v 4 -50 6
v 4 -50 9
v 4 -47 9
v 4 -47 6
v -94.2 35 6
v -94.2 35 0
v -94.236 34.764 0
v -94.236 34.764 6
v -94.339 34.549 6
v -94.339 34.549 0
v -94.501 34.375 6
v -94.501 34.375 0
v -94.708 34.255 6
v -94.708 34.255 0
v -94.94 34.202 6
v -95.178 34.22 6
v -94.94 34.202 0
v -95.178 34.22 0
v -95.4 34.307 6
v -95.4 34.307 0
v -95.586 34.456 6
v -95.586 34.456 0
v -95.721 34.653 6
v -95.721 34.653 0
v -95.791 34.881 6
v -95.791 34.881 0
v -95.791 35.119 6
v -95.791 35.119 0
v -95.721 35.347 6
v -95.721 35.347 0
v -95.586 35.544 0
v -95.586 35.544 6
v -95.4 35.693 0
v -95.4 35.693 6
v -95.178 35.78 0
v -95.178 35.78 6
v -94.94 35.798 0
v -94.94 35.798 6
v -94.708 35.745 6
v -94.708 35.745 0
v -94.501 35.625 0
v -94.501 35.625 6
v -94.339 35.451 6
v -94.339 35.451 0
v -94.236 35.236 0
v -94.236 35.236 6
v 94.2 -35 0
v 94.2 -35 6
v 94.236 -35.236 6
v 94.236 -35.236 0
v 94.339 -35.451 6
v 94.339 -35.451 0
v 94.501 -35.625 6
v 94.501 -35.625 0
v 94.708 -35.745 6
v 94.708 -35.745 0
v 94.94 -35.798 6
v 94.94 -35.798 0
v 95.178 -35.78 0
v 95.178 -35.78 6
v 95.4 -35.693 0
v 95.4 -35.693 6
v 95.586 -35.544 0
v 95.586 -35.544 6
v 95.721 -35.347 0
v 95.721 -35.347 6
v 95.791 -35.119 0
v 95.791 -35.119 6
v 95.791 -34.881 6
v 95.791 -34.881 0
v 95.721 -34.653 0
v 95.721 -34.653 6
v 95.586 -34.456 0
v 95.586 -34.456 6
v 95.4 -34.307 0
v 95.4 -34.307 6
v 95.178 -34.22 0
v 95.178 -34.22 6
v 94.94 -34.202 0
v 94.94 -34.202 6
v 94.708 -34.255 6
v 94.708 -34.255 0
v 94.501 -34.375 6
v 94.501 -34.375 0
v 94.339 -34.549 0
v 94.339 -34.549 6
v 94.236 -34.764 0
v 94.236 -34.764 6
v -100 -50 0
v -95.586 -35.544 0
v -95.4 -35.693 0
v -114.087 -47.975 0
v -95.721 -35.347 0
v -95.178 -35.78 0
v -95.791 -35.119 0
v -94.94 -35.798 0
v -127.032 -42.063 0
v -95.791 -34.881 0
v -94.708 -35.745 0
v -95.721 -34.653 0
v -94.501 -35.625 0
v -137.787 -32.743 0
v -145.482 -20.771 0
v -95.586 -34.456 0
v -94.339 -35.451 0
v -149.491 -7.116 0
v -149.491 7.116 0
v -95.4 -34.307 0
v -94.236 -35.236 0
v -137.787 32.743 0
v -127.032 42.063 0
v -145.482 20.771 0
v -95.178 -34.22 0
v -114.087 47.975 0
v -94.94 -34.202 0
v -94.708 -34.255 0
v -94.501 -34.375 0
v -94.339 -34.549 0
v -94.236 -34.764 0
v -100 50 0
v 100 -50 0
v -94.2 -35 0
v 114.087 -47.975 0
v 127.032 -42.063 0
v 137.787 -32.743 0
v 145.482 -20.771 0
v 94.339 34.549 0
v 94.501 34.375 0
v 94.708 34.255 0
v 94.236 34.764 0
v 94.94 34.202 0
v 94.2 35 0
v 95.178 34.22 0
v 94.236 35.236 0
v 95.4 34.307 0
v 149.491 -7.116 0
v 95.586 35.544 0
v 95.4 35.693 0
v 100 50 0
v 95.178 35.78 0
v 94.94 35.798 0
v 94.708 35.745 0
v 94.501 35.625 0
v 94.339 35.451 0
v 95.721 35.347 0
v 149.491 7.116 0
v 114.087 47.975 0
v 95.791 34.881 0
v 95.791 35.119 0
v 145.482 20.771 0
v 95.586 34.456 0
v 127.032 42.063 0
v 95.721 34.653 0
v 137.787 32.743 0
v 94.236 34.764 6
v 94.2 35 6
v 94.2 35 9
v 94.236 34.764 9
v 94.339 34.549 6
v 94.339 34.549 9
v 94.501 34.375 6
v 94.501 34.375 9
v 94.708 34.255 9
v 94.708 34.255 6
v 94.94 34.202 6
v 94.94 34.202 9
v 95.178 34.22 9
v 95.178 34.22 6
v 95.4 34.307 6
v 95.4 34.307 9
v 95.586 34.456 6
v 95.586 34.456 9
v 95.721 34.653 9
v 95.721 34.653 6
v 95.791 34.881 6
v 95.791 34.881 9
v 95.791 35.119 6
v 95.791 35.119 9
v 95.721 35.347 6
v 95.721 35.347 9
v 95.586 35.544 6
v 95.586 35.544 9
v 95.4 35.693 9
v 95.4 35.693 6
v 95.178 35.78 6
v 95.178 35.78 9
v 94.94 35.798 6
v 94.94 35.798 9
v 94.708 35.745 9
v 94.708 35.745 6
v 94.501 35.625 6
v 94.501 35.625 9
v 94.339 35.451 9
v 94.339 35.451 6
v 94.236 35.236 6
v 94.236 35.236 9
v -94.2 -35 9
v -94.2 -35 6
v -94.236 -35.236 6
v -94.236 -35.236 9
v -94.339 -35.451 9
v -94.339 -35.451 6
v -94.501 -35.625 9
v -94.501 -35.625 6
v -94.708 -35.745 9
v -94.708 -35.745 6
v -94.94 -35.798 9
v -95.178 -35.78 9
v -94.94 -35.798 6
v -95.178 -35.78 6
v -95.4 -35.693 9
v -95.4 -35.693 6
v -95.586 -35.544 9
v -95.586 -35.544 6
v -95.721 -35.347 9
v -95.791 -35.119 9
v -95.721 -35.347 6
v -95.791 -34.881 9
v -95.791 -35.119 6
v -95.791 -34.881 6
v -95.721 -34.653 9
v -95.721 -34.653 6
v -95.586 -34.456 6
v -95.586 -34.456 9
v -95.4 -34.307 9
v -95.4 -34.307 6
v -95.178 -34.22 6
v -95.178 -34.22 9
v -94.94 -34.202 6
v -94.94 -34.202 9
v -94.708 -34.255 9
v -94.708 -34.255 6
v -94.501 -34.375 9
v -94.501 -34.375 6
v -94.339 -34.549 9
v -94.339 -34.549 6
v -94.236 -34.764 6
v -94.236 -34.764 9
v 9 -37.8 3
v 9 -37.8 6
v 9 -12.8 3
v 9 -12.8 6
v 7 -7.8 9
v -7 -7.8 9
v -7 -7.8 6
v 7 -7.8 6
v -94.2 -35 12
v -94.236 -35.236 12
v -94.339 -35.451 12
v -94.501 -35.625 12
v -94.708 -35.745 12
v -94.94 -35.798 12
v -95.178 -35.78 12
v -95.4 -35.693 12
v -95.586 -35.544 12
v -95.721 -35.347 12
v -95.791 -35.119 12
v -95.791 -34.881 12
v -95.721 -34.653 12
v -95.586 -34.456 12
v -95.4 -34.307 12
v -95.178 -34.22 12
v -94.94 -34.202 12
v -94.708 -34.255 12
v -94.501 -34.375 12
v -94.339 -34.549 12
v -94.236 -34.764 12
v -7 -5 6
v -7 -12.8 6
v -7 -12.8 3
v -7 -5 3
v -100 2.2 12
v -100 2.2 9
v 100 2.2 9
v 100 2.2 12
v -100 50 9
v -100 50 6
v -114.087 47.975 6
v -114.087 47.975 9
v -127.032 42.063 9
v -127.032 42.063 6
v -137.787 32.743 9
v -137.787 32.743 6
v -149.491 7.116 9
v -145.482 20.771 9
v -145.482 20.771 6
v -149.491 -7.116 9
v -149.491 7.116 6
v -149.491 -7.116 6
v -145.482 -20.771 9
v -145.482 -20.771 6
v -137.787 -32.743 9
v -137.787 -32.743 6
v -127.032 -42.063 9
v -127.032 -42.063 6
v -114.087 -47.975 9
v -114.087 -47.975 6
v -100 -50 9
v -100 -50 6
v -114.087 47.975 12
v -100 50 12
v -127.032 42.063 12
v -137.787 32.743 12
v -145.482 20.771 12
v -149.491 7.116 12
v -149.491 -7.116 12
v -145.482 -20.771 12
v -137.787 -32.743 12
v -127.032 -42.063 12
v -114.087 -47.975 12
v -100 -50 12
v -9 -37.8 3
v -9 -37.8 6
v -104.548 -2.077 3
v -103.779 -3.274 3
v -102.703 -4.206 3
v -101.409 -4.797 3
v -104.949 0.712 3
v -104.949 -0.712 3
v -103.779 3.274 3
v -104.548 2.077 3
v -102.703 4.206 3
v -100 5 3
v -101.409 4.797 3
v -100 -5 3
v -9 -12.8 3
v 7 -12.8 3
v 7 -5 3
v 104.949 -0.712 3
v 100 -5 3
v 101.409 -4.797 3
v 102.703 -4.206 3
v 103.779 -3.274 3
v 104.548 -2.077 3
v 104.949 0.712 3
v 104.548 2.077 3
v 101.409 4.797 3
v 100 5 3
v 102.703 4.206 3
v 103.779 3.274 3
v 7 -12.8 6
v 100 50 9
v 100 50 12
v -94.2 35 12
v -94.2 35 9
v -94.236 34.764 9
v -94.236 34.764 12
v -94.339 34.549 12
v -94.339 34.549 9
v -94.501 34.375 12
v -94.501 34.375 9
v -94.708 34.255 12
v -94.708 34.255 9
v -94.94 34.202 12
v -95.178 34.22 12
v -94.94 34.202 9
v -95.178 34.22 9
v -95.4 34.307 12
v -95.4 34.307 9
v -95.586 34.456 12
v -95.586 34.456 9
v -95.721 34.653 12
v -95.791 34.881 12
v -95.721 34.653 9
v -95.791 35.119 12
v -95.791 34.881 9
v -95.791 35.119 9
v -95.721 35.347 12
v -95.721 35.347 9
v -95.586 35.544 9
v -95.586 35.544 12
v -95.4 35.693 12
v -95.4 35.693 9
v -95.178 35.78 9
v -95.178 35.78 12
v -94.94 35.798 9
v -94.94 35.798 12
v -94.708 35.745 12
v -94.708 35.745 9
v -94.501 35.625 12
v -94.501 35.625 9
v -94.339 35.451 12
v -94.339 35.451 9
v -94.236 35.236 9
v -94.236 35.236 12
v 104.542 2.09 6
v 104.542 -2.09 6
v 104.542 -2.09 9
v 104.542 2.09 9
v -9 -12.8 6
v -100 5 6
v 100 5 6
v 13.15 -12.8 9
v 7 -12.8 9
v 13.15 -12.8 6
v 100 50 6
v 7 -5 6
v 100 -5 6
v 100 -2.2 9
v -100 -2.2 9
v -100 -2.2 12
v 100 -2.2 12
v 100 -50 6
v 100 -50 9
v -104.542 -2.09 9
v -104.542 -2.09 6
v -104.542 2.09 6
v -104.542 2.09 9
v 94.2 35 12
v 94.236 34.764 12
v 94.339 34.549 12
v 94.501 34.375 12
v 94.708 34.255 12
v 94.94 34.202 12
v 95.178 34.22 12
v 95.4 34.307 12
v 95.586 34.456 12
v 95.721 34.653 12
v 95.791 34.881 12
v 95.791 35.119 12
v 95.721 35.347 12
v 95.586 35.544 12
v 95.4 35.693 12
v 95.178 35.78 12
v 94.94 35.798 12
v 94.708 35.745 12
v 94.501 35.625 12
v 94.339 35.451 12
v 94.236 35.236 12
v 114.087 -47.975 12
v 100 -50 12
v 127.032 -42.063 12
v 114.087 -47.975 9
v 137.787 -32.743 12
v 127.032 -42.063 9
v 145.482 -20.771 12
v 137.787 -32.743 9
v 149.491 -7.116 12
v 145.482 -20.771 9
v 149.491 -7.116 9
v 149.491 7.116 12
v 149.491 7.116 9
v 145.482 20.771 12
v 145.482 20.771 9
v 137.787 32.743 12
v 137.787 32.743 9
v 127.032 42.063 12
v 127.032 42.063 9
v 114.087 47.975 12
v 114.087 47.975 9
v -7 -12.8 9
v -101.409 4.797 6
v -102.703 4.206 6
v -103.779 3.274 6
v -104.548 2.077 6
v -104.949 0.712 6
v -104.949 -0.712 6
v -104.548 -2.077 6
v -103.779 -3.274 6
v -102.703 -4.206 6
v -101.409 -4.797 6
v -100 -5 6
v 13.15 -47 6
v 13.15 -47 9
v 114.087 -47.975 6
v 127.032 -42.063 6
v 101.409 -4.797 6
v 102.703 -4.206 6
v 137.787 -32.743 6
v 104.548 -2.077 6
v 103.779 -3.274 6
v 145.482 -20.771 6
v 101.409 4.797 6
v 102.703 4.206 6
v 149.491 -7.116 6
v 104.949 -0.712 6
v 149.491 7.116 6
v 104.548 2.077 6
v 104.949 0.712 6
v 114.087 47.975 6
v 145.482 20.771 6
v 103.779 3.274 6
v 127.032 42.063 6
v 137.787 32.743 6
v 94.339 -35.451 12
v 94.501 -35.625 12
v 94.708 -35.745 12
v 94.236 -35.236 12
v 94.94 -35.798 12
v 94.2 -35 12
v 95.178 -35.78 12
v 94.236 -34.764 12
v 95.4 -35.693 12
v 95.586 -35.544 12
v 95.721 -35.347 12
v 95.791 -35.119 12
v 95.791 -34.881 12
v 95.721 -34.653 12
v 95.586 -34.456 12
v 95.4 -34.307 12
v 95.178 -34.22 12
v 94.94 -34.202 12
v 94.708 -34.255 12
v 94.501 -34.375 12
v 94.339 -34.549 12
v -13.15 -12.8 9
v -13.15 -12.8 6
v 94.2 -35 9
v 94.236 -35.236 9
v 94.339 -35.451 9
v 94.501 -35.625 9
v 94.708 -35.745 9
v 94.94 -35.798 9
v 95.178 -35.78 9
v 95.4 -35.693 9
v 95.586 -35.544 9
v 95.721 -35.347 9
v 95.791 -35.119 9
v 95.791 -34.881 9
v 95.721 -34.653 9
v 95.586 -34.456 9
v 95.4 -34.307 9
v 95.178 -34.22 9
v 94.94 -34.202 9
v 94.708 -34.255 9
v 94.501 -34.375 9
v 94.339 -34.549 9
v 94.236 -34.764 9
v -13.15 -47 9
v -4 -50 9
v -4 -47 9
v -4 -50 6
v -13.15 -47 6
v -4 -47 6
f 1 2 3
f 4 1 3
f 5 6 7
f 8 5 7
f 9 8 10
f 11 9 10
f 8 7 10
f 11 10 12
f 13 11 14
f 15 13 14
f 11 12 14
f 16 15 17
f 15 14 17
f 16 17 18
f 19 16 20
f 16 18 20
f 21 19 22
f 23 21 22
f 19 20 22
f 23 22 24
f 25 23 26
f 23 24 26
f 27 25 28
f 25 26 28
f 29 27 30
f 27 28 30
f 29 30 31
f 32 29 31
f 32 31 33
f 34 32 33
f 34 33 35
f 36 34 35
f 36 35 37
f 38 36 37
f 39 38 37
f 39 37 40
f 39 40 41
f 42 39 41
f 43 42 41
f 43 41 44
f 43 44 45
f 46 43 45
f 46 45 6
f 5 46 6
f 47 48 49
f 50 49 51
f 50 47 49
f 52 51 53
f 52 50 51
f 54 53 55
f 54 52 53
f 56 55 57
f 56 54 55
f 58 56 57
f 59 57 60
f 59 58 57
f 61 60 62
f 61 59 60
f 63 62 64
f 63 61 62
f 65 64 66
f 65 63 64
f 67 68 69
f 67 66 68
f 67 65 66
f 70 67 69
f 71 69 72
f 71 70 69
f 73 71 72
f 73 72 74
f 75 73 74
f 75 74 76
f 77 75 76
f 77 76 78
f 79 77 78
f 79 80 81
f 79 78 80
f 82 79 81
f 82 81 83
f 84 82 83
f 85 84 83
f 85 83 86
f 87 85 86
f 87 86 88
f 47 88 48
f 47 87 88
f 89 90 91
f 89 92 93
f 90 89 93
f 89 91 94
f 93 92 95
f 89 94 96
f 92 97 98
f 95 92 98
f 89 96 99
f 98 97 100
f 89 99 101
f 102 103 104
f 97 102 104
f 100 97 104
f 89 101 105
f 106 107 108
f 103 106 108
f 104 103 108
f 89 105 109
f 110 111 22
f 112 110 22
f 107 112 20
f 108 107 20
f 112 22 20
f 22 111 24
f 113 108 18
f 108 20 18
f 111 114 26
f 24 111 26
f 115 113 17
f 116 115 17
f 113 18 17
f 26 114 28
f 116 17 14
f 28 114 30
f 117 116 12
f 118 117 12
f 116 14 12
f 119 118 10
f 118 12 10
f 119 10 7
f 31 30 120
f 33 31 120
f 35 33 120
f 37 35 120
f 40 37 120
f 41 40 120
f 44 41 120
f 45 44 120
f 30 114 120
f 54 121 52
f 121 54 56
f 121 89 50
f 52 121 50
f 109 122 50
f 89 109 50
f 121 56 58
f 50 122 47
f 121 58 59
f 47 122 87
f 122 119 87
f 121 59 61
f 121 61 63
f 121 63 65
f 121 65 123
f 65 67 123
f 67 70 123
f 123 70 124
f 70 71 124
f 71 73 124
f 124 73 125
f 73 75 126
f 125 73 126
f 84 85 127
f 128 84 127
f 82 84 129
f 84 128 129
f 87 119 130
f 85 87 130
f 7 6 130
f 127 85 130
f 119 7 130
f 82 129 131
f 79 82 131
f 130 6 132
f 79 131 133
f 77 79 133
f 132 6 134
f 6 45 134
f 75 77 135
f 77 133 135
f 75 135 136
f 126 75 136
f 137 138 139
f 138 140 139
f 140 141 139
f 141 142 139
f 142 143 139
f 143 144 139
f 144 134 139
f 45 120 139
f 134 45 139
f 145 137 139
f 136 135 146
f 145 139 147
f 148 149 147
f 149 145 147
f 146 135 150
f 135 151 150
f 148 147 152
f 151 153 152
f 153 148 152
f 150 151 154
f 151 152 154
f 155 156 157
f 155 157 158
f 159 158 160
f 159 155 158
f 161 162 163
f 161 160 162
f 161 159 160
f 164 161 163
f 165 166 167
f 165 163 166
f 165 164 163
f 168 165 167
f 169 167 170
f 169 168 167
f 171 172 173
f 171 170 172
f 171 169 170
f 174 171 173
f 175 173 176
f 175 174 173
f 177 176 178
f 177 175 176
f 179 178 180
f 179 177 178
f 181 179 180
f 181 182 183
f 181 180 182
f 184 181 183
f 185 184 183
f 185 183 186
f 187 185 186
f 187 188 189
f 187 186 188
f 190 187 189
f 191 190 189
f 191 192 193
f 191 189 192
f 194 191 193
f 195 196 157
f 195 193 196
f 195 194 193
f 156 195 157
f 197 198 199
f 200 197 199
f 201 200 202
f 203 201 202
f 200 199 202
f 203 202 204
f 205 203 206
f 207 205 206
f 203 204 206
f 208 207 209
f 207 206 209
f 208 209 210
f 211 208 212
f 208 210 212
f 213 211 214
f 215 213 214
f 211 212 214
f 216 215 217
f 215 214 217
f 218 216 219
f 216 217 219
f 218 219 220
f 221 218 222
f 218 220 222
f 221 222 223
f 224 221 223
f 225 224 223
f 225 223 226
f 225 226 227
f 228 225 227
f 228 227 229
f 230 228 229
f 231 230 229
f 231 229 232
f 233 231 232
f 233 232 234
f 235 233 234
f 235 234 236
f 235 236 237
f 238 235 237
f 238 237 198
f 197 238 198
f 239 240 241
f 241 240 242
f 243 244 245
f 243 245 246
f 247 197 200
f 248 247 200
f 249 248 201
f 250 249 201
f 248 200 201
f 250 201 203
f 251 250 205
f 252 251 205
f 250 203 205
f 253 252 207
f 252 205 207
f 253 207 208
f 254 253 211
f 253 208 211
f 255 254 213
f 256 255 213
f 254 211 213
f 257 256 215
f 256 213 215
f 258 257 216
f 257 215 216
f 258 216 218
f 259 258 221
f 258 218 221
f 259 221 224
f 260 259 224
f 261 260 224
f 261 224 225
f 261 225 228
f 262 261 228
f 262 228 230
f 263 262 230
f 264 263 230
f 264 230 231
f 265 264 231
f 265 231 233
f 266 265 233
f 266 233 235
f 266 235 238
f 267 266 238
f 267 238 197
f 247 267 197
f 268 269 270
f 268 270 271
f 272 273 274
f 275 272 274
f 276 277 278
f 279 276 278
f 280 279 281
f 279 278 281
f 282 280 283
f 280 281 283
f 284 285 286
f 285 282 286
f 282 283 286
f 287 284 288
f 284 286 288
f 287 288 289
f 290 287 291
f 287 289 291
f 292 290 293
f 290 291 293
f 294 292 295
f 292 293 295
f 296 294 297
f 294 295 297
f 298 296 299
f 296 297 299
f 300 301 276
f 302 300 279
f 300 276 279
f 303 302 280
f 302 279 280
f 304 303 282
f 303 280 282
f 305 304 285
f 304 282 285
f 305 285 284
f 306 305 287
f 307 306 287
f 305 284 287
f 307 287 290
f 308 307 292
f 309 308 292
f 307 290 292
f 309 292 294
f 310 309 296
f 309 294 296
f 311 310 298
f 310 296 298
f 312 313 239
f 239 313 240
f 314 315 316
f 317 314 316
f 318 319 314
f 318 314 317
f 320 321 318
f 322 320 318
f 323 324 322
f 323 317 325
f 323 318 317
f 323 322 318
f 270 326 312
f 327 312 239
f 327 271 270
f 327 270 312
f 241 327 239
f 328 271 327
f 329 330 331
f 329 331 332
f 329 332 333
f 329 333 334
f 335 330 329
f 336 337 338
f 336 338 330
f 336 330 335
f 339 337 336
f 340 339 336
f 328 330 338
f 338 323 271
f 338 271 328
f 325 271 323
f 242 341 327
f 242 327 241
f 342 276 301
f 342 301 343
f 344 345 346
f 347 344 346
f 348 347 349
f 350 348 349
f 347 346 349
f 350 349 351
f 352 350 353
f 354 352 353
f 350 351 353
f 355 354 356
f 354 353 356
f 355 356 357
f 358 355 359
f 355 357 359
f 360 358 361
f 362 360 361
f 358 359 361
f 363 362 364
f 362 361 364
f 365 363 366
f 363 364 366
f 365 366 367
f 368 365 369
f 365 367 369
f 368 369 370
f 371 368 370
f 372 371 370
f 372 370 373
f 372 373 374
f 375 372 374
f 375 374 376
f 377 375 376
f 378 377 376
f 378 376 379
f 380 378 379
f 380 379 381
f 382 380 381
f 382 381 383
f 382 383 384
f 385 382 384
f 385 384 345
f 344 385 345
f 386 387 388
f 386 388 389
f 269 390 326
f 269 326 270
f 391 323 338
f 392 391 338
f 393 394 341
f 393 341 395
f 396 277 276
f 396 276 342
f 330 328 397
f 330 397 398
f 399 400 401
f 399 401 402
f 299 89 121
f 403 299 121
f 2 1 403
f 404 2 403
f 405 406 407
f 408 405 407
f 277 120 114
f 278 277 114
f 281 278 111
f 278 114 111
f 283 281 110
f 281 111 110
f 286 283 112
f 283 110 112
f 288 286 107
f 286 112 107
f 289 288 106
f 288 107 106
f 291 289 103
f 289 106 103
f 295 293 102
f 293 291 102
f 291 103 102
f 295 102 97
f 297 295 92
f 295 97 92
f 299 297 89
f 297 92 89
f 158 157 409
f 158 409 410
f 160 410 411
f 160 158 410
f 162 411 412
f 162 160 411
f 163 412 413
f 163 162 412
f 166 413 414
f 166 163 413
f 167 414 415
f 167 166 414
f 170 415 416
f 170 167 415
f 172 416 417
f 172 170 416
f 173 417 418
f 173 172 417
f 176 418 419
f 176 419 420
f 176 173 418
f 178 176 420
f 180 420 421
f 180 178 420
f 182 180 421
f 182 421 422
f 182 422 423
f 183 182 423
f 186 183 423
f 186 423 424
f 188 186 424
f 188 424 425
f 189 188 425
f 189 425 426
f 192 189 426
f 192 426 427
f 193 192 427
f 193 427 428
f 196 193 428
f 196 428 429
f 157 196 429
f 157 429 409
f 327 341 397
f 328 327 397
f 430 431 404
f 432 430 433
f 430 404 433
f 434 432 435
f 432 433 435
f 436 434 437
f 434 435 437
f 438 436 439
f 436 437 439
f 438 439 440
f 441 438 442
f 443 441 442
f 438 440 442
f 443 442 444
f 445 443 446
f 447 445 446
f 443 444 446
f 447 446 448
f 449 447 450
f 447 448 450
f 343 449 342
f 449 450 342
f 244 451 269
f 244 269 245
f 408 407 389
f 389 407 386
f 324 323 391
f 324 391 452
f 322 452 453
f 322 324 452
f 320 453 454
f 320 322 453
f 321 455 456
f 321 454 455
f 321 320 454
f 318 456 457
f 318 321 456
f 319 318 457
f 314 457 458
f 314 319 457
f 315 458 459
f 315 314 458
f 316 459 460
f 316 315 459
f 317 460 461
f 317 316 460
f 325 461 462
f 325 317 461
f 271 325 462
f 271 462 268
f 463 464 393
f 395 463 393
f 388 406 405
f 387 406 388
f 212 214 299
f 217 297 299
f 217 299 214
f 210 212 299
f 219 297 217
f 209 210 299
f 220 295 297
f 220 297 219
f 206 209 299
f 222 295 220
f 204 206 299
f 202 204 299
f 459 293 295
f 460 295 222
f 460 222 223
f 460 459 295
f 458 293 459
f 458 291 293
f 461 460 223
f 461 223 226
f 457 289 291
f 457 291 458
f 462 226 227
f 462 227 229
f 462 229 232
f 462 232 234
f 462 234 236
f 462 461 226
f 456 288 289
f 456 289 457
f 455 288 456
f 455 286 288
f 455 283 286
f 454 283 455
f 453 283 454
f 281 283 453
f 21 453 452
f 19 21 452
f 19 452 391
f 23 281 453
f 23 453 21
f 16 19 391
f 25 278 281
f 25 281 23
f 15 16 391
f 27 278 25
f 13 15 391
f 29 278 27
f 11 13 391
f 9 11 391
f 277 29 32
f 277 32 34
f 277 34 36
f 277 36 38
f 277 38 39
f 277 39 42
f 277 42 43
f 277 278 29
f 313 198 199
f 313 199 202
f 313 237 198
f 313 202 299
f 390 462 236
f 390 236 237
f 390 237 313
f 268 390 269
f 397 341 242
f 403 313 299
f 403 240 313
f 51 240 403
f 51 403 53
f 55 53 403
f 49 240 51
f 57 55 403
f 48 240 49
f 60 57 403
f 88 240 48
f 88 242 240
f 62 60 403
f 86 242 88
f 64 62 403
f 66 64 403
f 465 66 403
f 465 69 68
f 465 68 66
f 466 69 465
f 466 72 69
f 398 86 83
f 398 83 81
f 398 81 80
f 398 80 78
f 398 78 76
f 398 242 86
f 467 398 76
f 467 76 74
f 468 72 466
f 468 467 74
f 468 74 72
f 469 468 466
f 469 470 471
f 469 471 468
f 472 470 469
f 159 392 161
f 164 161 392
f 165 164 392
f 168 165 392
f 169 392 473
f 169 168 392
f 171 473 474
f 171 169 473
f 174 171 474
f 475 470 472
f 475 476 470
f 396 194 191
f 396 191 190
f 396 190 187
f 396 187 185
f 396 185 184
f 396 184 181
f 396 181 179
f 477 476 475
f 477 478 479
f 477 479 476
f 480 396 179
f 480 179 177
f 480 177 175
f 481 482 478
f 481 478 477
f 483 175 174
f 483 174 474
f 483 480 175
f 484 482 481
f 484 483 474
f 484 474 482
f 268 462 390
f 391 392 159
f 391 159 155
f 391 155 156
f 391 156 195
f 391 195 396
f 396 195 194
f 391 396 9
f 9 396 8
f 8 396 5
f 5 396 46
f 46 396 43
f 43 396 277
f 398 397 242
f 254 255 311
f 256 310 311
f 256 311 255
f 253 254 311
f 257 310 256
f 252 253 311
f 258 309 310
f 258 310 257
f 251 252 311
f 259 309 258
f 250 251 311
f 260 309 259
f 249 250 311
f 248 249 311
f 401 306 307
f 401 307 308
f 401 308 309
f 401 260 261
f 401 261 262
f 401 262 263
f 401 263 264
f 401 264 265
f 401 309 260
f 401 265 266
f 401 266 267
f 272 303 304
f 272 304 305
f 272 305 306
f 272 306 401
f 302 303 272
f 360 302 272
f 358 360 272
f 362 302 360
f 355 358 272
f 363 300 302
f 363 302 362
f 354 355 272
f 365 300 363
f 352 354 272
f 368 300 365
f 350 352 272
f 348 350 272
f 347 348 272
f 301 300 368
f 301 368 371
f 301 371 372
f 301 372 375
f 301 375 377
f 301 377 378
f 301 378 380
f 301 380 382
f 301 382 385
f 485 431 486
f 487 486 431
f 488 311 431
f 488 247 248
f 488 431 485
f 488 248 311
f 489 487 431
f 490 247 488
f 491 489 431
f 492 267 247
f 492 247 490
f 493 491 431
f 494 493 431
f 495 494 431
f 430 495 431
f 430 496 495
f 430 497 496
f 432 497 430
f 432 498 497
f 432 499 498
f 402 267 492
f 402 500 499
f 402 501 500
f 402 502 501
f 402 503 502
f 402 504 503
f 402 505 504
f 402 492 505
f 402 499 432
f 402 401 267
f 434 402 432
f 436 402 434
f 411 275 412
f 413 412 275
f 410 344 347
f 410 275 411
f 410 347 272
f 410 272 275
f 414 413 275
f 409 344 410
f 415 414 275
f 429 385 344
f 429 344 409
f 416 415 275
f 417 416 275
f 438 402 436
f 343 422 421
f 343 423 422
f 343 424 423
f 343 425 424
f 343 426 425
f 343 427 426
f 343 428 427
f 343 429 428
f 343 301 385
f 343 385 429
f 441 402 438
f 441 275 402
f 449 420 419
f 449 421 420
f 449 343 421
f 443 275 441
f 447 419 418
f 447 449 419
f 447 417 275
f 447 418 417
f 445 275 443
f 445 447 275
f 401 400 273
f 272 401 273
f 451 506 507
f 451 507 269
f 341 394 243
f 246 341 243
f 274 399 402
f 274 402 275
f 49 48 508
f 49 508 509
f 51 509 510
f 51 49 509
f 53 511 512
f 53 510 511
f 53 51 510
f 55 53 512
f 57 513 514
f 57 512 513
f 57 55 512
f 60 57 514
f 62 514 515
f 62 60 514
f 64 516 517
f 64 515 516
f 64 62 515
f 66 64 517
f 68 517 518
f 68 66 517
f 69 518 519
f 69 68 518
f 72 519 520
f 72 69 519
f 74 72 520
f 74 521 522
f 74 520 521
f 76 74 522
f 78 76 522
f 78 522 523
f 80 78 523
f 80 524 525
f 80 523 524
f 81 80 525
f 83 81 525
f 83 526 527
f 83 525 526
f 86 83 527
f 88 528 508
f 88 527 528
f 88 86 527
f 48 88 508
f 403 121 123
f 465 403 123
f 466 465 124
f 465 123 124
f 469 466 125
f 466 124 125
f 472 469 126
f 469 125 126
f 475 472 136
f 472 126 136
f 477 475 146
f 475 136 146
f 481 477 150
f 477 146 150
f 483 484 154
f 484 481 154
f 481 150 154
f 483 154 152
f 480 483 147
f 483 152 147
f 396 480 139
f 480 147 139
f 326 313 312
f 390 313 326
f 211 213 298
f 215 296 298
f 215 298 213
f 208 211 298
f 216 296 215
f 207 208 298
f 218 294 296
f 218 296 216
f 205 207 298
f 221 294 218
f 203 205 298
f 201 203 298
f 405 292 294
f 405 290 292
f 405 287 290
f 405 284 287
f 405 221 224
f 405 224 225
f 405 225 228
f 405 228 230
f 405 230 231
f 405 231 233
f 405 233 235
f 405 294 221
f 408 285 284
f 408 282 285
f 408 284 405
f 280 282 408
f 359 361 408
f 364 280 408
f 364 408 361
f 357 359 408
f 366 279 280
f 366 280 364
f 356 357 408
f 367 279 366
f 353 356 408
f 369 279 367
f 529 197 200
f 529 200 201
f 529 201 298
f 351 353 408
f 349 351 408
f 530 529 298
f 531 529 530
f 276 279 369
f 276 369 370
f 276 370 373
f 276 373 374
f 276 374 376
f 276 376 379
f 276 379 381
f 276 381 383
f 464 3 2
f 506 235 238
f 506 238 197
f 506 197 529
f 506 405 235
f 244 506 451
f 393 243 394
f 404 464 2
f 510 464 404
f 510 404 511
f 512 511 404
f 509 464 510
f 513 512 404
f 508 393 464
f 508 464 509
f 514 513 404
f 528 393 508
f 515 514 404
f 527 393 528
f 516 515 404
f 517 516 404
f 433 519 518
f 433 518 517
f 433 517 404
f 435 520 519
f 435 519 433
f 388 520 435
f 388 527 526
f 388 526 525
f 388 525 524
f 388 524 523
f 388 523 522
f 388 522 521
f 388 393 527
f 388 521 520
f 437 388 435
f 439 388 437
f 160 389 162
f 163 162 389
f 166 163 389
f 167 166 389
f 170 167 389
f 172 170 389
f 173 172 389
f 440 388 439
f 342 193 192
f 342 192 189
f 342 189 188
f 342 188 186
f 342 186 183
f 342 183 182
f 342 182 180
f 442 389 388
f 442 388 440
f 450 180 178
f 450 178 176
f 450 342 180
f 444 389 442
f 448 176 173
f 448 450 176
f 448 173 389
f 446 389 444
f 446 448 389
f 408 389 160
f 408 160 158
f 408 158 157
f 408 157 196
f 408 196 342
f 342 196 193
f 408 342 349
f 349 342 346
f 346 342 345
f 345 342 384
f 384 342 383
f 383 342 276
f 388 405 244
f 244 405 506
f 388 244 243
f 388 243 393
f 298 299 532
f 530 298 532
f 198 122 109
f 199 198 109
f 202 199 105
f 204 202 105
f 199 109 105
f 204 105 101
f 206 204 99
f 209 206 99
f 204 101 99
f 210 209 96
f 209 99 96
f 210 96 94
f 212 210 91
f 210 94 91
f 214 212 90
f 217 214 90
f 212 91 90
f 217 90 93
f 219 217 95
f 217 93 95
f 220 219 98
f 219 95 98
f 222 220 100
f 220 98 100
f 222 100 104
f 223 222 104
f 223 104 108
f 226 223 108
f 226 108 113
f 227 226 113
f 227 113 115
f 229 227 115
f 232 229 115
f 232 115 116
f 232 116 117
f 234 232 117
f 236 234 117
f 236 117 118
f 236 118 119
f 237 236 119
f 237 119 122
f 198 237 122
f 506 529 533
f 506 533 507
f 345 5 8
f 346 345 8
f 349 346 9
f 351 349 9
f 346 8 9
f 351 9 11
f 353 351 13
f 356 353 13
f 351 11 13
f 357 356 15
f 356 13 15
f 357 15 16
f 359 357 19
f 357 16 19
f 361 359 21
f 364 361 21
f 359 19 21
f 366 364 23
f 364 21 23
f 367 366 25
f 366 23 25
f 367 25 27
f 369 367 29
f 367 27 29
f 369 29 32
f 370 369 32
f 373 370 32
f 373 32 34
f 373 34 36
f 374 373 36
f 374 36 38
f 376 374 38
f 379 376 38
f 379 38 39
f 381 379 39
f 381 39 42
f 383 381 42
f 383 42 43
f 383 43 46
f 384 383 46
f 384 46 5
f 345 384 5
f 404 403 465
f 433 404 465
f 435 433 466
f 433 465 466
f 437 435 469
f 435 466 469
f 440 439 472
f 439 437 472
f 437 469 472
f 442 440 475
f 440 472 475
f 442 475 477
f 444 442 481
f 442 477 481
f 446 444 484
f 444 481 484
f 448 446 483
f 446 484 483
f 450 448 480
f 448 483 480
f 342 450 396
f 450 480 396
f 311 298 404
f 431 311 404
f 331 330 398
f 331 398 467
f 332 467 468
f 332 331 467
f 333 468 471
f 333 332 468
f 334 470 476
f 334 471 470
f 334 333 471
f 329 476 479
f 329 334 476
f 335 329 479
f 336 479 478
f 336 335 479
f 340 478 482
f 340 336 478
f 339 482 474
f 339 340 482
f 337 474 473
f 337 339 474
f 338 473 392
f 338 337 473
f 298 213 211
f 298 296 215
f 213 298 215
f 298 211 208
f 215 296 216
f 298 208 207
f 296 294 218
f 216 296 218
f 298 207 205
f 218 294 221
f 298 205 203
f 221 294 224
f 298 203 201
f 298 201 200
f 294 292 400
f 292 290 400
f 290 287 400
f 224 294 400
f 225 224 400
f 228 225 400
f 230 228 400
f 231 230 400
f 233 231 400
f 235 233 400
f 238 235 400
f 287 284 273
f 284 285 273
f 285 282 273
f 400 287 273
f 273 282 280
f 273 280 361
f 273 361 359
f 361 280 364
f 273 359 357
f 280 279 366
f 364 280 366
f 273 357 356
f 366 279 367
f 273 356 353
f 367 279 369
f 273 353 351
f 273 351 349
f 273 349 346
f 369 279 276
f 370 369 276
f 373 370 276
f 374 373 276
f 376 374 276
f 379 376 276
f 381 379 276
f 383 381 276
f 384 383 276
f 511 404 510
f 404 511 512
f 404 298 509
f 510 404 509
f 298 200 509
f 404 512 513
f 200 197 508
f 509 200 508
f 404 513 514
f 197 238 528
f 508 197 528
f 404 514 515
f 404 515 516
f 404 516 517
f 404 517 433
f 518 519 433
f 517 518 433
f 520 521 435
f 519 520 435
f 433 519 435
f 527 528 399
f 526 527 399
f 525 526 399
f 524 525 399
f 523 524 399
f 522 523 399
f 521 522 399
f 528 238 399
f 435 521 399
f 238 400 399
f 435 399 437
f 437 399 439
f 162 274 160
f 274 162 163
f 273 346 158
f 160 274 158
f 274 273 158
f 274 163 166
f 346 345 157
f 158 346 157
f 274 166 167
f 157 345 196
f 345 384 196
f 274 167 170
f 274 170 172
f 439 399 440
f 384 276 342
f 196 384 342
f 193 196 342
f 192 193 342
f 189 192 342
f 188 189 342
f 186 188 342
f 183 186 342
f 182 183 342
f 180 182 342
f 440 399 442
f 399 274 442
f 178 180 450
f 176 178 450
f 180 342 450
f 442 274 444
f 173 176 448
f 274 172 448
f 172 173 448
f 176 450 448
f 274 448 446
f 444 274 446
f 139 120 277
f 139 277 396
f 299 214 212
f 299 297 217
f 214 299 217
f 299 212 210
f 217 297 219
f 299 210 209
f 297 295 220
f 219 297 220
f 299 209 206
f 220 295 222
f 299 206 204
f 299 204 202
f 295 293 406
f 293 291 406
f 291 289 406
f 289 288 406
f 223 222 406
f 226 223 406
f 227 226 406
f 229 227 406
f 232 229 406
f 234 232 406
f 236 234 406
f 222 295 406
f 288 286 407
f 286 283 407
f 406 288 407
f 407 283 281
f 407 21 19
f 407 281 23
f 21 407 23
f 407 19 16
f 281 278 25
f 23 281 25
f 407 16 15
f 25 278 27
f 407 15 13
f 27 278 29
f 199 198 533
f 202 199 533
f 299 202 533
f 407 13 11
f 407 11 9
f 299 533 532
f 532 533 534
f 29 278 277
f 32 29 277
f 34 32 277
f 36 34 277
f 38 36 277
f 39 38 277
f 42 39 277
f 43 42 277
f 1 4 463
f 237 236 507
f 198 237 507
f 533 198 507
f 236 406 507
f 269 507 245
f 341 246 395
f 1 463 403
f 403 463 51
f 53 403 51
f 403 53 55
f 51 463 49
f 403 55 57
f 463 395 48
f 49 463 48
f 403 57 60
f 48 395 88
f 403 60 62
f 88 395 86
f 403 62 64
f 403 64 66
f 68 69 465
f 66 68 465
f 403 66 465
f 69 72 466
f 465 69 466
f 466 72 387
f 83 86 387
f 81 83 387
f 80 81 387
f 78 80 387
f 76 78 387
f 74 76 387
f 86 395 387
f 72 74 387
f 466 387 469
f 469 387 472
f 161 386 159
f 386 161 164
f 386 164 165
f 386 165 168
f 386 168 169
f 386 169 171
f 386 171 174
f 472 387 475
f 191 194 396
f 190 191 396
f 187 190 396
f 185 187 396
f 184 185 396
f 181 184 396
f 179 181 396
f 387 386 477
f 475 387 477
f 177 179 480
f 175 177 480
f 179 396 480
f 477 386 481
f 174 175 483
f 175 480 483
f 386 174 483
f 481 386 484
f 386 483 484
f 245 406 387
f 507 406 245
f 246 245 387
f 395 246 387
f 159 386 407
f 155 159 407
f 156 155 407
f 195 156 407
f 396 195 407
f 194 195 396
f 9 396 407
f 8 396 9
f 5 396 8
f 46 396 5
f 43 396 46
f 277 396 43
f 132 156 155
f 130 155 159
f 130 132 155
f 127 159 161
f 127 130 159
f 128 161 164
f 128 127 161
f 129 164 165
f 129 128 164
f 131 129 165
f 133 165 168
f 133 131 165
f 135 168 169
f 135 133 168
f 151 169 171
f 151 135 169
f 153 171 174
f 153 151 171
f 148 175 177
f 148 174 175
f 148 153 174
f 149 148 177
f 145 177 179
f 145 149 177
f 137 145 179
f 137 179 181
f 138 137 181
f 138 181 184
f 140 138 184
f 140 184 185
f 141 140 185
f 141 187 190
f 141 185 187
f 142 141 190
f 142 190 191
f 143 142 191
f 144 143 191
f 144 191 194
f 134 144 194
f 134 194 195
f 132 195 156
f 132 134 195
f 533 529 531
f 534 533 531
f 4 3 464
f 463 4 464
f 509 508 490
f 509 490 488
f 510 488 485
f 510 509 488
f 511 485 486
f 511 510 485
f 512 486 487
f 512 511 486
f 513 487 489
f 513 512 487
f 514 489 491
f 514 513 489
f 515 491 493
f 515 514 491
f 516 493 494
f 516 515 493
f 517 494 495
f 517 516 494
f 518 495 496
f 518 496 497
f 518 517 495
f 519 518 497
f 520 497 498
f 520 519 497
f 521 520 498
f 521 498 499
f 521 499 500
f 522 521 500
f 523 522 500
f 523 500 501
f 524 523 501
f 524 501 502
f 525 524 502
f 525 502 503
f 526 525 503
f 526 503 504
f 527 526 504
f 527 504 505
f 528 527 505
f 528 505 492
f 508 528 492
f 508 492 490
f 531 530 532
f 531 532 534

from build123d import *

# Parameters (mm, degrees)
BOX_BOTTOM_HALF_0_W     = 301.98633
BOX_BOTTOM_HALF_0_H     = 102
BOX_BOTTOM_HALF_0_DEPTH = 7
PAD_DEPTH               = 3
PAD001_DEPTH            = 3
SKETCH002_W             = 209.08447
SKETCH002_H             = 4.18
PAD002_DEPTH            = 3
SKETCH003_W             = 26.3
SKETCH003_H             = 34.2
POCKET_DEPTH            = 3
SKETCH004_W             = 18
SKETCH004_H             = 25
POCKET001_DEPTH         = 3
SKETCH005_W             = 14
SKETCH005_H             = 5
POCKET002_DEPTH         = 6
SKETCH006_W             = 14
SKETCH006_H             = 3
POCKET003_DEPTH         = 3
SKETCH007_W             = 8
SKETCH007_H             = 3
POCKET004_DEPTH         = 3
SKETCH008_W             = 200
SKETCH008_H             = 4.4
PAD003_DEPTH            = 3
SKETCH009_R             = 0.8
POCKET005_DEPTH         = 12
BOX_BOTTOM_HALF_1_W     = 301.98633
BOX_BOTTOM_HALF_1_H     = 102
BOX_BOTTOM_HALF_1_DEPTH = 4


with BuildPart() as box_bottom_half_0_body:
    # box_bottom_half_0 → box_bottom_half_0 (new body)
    with BuildSketch(Plane(origin=(-150.993165, -51, -1), x_dir=(1, 0, 0), z_dir=(0, 0, 1))):
        with Locations((150.993165, 51)):
            Rectangle(BOX_BOTTOM_HALF_0_W, BOX_BOTTOM_HALF_0_H)
    extrude(amount=BOX_BOTTOM_HALF_0_DEPTH)


with BuildPart() as body:
    # Sketch → Pad (new body)
    with BuildSketch(Plane.XY):
        with BuildLine():
            ThreePointArc((-100, 50), (-150, 0), (-100, -50))
            Line((-100, -50), (100, -50))
            ThreePointArc((100, -50), (150, 0), (100, 50))
            Line((-100, 50), (100, 50))
        make_face()
    extrude(amount=PAD_DEPTH)

    # Sketch001 (on Face6 of Pad) → Pad001 (join)
    with BuildSketch(Plane.XY.offset(3)):
        with BuildLine():
            ThreePointArc((-100, 50), (-150, 0), (-100, -50))
            Line((-100, -50), (100, -50))
            ThreePointArc((100, -50), (150, 0), (100, 50))
            Line((-100, 50), (100, 50))
        make_face()
        with BuildLine():
            ThreePointArc((-100, 5), (-105, 0), (-100, -5))
            Line((-100, -5), (100, -5))
            ThreePointArc((100, -5), (105, 0), (100, 5))
            Line((-100, 5), (100, 5))
        make_face(mode=Mode.SUBTRACT)
    extrude(amount=PAD001_DEPTH)

    # Sketch002 (on Face9 of Pad001) → Pad002 (join)
    with BuildSketch(Plane.XY.offset(6)):
        with BuildLine():
            ThreePointArc((-100, 50), (-150, 0), (-100, -50))
            Line((-100, -50), (100, -50))
            ThreePointArc((100, -50), (150, 0), (100, 50))
            Line((-100, 50), (100, 50))
        make_face()
        Rectangle(SKETCH002_W, SKETCH002_H, mode=Mode.SUBTRACT)
    extrude(amount=PAD002_DEPTH)

    # Sketch003 (on Face13 of Pad002) → Pocket (cut)
    with BuildSketch(Plane.XY.offset(9)):
        with Locations((0, -29.9)):
            Rectangle(SKETCH003_W, SKETCH003_H)
    extrude(amount=-POCKET_DEPTH, mode=Mode.SUBTRACT)

    # Sketch004 (on Face27 of Pocket) → Pocket001 (cut)
    with BuildSketch(Plane.XY.offset(6)):
        with Locations((0, -25.3)):
            Rectangle(SKETCH004_W, SKETCH004_H)
    extrude(amount=-POCKET001_DEPTH, mode=Mode.SUBTRACT)

    # Sketch005 (on Face13 of Pocket001) → Pocket002 (cut)
    with BuildSketch(Plane.XY.offset(9)):
        with Locations((0, -10.3)):
            Rectangle(SKETCH005_W, SKETCH005_H)
    extrude(amount=-POCKET002_DEPTH, mode=Mode.SUBTRACT)

    # Sketch006 (on Face23 of Pocket002) → Pocket003 (cut)
    with BuildSketch(Plane.XZ.offset(7.8)):
        with Locations((0, 4.5)):
            Rectangle(SKETCH006_W, SKETCH006_H)
    extrude(amount=-POCKET003_DEPTH, mode=Mode.SUBTRACT)

    # Sketch007 (on Face13 of Pocket003) → Pocket004 (cut)
    with BuildSketch(Plane.XY.offset(9)):
        with Locations((0, -48.5)):
            Rectangle(SKETCH007_W, SKETCH007_H)
    extrude(amount=-POCKET004_DEPTH, mode=Mode.SUBTRACT)

    # Sketch008 (on Face15 of Pocket004) → Pad003 (join)
    with BuildSketch(Plane.XY.offset(9)):
        with BuildLine():
            ThreePointArc((-100, 50), (-150, 0), (-100, -50))
            Line((-100, -50), (100, -50))
            ThreePointArc((100, -50), (150, 0), (100, 50))
            Line((-100, 50), (100, 50))
        make_face()
        Rectangle(SKETCH008_W, SKETCH008_H, mode=Mode.SUBTRACT)
    extrude(amount=PAD003_DEPTH)

    # Sketch009 (on Face4 of Pad003) → Pocket005 (cut)
    with BuildSketch(Plane(origin=(0, 0, 0), x_dir=(1, 0, 0), z_dir=(0, 0, -1))):
        with Locations((-95, 35)):
            Circle(SKETCH009_R)
        with Locations((-95, -35)):
            Circle(SKETCH009_R)
    pocket005 = extrude(amount=-POCKET005_DEPTH, mode=Mode.SUBTRACT)

    # Mirrored: Pocket005 across Sketch009 V_Axis
    add(pocket005.mirror(Plane(origin=(0, 0, 0), x_dir=(0, 0, -1), z_dir=(1, 0, 0))), mode=Mode.SUBTRACT)


with BuildPart() as bottom_half_0_body:
    # bottom_half_0 base: copy of Body
    add(body.part)

    # bottom_half_0: intersect box_bottom_half_0 body
    add(box_bottom_half_0_body.part, mode=Mode.INTERSECT)


with BuildPart() as box_bottom_half_1_body:
    # box_bottom_half_1 → box_bottom_half_1 (new body)
    with BuildSketch(Plane(origin=(-150.993165, -51, 5), x_dir=(1, 0, 0), z_dir=(0, 0, 1))):
        with Locations((150.993165, 51)):
            Rectangle(BOX_BOTTOM_HALF_1_W, BOX_BOTTOM_HALF_1_H)
    extrude(amount=BOX_BOTTOM_HALF_1_DEPTH)


with BuildPart() as top_half_0_body:
    # top_half_0 base: copy of Body
    add(body.part)

    # top_half_0: cut box_bottom_half_0 body
    add(box_bottom_half_0_body.part, mode=Mode.SUBTRACT)


with BuildPart() as bottom_half_1_body:
    # bottom_half_1 base: copy of top_half_0 body
    add(top_half_0_body.part)

    # bottom_half_1: intersect box_bottom_half_1 body
    add(box_bottom_half_1_body.part, mode=Mode.INTERSECT)


with BuildPart() as top_half_1_body:
    # top_half_1 base: copy of top_half_0 body
    add(top_half_0_body.part)

    # top_half_1: cut box_bottom_half_1 body
    add(box_bottom_half_1_body.part, mode=Mode.SUBTRACT)


solid = Compound([bottom_half_0_body.part, bottom_half_1_body.part, top_half_1_body.part])
